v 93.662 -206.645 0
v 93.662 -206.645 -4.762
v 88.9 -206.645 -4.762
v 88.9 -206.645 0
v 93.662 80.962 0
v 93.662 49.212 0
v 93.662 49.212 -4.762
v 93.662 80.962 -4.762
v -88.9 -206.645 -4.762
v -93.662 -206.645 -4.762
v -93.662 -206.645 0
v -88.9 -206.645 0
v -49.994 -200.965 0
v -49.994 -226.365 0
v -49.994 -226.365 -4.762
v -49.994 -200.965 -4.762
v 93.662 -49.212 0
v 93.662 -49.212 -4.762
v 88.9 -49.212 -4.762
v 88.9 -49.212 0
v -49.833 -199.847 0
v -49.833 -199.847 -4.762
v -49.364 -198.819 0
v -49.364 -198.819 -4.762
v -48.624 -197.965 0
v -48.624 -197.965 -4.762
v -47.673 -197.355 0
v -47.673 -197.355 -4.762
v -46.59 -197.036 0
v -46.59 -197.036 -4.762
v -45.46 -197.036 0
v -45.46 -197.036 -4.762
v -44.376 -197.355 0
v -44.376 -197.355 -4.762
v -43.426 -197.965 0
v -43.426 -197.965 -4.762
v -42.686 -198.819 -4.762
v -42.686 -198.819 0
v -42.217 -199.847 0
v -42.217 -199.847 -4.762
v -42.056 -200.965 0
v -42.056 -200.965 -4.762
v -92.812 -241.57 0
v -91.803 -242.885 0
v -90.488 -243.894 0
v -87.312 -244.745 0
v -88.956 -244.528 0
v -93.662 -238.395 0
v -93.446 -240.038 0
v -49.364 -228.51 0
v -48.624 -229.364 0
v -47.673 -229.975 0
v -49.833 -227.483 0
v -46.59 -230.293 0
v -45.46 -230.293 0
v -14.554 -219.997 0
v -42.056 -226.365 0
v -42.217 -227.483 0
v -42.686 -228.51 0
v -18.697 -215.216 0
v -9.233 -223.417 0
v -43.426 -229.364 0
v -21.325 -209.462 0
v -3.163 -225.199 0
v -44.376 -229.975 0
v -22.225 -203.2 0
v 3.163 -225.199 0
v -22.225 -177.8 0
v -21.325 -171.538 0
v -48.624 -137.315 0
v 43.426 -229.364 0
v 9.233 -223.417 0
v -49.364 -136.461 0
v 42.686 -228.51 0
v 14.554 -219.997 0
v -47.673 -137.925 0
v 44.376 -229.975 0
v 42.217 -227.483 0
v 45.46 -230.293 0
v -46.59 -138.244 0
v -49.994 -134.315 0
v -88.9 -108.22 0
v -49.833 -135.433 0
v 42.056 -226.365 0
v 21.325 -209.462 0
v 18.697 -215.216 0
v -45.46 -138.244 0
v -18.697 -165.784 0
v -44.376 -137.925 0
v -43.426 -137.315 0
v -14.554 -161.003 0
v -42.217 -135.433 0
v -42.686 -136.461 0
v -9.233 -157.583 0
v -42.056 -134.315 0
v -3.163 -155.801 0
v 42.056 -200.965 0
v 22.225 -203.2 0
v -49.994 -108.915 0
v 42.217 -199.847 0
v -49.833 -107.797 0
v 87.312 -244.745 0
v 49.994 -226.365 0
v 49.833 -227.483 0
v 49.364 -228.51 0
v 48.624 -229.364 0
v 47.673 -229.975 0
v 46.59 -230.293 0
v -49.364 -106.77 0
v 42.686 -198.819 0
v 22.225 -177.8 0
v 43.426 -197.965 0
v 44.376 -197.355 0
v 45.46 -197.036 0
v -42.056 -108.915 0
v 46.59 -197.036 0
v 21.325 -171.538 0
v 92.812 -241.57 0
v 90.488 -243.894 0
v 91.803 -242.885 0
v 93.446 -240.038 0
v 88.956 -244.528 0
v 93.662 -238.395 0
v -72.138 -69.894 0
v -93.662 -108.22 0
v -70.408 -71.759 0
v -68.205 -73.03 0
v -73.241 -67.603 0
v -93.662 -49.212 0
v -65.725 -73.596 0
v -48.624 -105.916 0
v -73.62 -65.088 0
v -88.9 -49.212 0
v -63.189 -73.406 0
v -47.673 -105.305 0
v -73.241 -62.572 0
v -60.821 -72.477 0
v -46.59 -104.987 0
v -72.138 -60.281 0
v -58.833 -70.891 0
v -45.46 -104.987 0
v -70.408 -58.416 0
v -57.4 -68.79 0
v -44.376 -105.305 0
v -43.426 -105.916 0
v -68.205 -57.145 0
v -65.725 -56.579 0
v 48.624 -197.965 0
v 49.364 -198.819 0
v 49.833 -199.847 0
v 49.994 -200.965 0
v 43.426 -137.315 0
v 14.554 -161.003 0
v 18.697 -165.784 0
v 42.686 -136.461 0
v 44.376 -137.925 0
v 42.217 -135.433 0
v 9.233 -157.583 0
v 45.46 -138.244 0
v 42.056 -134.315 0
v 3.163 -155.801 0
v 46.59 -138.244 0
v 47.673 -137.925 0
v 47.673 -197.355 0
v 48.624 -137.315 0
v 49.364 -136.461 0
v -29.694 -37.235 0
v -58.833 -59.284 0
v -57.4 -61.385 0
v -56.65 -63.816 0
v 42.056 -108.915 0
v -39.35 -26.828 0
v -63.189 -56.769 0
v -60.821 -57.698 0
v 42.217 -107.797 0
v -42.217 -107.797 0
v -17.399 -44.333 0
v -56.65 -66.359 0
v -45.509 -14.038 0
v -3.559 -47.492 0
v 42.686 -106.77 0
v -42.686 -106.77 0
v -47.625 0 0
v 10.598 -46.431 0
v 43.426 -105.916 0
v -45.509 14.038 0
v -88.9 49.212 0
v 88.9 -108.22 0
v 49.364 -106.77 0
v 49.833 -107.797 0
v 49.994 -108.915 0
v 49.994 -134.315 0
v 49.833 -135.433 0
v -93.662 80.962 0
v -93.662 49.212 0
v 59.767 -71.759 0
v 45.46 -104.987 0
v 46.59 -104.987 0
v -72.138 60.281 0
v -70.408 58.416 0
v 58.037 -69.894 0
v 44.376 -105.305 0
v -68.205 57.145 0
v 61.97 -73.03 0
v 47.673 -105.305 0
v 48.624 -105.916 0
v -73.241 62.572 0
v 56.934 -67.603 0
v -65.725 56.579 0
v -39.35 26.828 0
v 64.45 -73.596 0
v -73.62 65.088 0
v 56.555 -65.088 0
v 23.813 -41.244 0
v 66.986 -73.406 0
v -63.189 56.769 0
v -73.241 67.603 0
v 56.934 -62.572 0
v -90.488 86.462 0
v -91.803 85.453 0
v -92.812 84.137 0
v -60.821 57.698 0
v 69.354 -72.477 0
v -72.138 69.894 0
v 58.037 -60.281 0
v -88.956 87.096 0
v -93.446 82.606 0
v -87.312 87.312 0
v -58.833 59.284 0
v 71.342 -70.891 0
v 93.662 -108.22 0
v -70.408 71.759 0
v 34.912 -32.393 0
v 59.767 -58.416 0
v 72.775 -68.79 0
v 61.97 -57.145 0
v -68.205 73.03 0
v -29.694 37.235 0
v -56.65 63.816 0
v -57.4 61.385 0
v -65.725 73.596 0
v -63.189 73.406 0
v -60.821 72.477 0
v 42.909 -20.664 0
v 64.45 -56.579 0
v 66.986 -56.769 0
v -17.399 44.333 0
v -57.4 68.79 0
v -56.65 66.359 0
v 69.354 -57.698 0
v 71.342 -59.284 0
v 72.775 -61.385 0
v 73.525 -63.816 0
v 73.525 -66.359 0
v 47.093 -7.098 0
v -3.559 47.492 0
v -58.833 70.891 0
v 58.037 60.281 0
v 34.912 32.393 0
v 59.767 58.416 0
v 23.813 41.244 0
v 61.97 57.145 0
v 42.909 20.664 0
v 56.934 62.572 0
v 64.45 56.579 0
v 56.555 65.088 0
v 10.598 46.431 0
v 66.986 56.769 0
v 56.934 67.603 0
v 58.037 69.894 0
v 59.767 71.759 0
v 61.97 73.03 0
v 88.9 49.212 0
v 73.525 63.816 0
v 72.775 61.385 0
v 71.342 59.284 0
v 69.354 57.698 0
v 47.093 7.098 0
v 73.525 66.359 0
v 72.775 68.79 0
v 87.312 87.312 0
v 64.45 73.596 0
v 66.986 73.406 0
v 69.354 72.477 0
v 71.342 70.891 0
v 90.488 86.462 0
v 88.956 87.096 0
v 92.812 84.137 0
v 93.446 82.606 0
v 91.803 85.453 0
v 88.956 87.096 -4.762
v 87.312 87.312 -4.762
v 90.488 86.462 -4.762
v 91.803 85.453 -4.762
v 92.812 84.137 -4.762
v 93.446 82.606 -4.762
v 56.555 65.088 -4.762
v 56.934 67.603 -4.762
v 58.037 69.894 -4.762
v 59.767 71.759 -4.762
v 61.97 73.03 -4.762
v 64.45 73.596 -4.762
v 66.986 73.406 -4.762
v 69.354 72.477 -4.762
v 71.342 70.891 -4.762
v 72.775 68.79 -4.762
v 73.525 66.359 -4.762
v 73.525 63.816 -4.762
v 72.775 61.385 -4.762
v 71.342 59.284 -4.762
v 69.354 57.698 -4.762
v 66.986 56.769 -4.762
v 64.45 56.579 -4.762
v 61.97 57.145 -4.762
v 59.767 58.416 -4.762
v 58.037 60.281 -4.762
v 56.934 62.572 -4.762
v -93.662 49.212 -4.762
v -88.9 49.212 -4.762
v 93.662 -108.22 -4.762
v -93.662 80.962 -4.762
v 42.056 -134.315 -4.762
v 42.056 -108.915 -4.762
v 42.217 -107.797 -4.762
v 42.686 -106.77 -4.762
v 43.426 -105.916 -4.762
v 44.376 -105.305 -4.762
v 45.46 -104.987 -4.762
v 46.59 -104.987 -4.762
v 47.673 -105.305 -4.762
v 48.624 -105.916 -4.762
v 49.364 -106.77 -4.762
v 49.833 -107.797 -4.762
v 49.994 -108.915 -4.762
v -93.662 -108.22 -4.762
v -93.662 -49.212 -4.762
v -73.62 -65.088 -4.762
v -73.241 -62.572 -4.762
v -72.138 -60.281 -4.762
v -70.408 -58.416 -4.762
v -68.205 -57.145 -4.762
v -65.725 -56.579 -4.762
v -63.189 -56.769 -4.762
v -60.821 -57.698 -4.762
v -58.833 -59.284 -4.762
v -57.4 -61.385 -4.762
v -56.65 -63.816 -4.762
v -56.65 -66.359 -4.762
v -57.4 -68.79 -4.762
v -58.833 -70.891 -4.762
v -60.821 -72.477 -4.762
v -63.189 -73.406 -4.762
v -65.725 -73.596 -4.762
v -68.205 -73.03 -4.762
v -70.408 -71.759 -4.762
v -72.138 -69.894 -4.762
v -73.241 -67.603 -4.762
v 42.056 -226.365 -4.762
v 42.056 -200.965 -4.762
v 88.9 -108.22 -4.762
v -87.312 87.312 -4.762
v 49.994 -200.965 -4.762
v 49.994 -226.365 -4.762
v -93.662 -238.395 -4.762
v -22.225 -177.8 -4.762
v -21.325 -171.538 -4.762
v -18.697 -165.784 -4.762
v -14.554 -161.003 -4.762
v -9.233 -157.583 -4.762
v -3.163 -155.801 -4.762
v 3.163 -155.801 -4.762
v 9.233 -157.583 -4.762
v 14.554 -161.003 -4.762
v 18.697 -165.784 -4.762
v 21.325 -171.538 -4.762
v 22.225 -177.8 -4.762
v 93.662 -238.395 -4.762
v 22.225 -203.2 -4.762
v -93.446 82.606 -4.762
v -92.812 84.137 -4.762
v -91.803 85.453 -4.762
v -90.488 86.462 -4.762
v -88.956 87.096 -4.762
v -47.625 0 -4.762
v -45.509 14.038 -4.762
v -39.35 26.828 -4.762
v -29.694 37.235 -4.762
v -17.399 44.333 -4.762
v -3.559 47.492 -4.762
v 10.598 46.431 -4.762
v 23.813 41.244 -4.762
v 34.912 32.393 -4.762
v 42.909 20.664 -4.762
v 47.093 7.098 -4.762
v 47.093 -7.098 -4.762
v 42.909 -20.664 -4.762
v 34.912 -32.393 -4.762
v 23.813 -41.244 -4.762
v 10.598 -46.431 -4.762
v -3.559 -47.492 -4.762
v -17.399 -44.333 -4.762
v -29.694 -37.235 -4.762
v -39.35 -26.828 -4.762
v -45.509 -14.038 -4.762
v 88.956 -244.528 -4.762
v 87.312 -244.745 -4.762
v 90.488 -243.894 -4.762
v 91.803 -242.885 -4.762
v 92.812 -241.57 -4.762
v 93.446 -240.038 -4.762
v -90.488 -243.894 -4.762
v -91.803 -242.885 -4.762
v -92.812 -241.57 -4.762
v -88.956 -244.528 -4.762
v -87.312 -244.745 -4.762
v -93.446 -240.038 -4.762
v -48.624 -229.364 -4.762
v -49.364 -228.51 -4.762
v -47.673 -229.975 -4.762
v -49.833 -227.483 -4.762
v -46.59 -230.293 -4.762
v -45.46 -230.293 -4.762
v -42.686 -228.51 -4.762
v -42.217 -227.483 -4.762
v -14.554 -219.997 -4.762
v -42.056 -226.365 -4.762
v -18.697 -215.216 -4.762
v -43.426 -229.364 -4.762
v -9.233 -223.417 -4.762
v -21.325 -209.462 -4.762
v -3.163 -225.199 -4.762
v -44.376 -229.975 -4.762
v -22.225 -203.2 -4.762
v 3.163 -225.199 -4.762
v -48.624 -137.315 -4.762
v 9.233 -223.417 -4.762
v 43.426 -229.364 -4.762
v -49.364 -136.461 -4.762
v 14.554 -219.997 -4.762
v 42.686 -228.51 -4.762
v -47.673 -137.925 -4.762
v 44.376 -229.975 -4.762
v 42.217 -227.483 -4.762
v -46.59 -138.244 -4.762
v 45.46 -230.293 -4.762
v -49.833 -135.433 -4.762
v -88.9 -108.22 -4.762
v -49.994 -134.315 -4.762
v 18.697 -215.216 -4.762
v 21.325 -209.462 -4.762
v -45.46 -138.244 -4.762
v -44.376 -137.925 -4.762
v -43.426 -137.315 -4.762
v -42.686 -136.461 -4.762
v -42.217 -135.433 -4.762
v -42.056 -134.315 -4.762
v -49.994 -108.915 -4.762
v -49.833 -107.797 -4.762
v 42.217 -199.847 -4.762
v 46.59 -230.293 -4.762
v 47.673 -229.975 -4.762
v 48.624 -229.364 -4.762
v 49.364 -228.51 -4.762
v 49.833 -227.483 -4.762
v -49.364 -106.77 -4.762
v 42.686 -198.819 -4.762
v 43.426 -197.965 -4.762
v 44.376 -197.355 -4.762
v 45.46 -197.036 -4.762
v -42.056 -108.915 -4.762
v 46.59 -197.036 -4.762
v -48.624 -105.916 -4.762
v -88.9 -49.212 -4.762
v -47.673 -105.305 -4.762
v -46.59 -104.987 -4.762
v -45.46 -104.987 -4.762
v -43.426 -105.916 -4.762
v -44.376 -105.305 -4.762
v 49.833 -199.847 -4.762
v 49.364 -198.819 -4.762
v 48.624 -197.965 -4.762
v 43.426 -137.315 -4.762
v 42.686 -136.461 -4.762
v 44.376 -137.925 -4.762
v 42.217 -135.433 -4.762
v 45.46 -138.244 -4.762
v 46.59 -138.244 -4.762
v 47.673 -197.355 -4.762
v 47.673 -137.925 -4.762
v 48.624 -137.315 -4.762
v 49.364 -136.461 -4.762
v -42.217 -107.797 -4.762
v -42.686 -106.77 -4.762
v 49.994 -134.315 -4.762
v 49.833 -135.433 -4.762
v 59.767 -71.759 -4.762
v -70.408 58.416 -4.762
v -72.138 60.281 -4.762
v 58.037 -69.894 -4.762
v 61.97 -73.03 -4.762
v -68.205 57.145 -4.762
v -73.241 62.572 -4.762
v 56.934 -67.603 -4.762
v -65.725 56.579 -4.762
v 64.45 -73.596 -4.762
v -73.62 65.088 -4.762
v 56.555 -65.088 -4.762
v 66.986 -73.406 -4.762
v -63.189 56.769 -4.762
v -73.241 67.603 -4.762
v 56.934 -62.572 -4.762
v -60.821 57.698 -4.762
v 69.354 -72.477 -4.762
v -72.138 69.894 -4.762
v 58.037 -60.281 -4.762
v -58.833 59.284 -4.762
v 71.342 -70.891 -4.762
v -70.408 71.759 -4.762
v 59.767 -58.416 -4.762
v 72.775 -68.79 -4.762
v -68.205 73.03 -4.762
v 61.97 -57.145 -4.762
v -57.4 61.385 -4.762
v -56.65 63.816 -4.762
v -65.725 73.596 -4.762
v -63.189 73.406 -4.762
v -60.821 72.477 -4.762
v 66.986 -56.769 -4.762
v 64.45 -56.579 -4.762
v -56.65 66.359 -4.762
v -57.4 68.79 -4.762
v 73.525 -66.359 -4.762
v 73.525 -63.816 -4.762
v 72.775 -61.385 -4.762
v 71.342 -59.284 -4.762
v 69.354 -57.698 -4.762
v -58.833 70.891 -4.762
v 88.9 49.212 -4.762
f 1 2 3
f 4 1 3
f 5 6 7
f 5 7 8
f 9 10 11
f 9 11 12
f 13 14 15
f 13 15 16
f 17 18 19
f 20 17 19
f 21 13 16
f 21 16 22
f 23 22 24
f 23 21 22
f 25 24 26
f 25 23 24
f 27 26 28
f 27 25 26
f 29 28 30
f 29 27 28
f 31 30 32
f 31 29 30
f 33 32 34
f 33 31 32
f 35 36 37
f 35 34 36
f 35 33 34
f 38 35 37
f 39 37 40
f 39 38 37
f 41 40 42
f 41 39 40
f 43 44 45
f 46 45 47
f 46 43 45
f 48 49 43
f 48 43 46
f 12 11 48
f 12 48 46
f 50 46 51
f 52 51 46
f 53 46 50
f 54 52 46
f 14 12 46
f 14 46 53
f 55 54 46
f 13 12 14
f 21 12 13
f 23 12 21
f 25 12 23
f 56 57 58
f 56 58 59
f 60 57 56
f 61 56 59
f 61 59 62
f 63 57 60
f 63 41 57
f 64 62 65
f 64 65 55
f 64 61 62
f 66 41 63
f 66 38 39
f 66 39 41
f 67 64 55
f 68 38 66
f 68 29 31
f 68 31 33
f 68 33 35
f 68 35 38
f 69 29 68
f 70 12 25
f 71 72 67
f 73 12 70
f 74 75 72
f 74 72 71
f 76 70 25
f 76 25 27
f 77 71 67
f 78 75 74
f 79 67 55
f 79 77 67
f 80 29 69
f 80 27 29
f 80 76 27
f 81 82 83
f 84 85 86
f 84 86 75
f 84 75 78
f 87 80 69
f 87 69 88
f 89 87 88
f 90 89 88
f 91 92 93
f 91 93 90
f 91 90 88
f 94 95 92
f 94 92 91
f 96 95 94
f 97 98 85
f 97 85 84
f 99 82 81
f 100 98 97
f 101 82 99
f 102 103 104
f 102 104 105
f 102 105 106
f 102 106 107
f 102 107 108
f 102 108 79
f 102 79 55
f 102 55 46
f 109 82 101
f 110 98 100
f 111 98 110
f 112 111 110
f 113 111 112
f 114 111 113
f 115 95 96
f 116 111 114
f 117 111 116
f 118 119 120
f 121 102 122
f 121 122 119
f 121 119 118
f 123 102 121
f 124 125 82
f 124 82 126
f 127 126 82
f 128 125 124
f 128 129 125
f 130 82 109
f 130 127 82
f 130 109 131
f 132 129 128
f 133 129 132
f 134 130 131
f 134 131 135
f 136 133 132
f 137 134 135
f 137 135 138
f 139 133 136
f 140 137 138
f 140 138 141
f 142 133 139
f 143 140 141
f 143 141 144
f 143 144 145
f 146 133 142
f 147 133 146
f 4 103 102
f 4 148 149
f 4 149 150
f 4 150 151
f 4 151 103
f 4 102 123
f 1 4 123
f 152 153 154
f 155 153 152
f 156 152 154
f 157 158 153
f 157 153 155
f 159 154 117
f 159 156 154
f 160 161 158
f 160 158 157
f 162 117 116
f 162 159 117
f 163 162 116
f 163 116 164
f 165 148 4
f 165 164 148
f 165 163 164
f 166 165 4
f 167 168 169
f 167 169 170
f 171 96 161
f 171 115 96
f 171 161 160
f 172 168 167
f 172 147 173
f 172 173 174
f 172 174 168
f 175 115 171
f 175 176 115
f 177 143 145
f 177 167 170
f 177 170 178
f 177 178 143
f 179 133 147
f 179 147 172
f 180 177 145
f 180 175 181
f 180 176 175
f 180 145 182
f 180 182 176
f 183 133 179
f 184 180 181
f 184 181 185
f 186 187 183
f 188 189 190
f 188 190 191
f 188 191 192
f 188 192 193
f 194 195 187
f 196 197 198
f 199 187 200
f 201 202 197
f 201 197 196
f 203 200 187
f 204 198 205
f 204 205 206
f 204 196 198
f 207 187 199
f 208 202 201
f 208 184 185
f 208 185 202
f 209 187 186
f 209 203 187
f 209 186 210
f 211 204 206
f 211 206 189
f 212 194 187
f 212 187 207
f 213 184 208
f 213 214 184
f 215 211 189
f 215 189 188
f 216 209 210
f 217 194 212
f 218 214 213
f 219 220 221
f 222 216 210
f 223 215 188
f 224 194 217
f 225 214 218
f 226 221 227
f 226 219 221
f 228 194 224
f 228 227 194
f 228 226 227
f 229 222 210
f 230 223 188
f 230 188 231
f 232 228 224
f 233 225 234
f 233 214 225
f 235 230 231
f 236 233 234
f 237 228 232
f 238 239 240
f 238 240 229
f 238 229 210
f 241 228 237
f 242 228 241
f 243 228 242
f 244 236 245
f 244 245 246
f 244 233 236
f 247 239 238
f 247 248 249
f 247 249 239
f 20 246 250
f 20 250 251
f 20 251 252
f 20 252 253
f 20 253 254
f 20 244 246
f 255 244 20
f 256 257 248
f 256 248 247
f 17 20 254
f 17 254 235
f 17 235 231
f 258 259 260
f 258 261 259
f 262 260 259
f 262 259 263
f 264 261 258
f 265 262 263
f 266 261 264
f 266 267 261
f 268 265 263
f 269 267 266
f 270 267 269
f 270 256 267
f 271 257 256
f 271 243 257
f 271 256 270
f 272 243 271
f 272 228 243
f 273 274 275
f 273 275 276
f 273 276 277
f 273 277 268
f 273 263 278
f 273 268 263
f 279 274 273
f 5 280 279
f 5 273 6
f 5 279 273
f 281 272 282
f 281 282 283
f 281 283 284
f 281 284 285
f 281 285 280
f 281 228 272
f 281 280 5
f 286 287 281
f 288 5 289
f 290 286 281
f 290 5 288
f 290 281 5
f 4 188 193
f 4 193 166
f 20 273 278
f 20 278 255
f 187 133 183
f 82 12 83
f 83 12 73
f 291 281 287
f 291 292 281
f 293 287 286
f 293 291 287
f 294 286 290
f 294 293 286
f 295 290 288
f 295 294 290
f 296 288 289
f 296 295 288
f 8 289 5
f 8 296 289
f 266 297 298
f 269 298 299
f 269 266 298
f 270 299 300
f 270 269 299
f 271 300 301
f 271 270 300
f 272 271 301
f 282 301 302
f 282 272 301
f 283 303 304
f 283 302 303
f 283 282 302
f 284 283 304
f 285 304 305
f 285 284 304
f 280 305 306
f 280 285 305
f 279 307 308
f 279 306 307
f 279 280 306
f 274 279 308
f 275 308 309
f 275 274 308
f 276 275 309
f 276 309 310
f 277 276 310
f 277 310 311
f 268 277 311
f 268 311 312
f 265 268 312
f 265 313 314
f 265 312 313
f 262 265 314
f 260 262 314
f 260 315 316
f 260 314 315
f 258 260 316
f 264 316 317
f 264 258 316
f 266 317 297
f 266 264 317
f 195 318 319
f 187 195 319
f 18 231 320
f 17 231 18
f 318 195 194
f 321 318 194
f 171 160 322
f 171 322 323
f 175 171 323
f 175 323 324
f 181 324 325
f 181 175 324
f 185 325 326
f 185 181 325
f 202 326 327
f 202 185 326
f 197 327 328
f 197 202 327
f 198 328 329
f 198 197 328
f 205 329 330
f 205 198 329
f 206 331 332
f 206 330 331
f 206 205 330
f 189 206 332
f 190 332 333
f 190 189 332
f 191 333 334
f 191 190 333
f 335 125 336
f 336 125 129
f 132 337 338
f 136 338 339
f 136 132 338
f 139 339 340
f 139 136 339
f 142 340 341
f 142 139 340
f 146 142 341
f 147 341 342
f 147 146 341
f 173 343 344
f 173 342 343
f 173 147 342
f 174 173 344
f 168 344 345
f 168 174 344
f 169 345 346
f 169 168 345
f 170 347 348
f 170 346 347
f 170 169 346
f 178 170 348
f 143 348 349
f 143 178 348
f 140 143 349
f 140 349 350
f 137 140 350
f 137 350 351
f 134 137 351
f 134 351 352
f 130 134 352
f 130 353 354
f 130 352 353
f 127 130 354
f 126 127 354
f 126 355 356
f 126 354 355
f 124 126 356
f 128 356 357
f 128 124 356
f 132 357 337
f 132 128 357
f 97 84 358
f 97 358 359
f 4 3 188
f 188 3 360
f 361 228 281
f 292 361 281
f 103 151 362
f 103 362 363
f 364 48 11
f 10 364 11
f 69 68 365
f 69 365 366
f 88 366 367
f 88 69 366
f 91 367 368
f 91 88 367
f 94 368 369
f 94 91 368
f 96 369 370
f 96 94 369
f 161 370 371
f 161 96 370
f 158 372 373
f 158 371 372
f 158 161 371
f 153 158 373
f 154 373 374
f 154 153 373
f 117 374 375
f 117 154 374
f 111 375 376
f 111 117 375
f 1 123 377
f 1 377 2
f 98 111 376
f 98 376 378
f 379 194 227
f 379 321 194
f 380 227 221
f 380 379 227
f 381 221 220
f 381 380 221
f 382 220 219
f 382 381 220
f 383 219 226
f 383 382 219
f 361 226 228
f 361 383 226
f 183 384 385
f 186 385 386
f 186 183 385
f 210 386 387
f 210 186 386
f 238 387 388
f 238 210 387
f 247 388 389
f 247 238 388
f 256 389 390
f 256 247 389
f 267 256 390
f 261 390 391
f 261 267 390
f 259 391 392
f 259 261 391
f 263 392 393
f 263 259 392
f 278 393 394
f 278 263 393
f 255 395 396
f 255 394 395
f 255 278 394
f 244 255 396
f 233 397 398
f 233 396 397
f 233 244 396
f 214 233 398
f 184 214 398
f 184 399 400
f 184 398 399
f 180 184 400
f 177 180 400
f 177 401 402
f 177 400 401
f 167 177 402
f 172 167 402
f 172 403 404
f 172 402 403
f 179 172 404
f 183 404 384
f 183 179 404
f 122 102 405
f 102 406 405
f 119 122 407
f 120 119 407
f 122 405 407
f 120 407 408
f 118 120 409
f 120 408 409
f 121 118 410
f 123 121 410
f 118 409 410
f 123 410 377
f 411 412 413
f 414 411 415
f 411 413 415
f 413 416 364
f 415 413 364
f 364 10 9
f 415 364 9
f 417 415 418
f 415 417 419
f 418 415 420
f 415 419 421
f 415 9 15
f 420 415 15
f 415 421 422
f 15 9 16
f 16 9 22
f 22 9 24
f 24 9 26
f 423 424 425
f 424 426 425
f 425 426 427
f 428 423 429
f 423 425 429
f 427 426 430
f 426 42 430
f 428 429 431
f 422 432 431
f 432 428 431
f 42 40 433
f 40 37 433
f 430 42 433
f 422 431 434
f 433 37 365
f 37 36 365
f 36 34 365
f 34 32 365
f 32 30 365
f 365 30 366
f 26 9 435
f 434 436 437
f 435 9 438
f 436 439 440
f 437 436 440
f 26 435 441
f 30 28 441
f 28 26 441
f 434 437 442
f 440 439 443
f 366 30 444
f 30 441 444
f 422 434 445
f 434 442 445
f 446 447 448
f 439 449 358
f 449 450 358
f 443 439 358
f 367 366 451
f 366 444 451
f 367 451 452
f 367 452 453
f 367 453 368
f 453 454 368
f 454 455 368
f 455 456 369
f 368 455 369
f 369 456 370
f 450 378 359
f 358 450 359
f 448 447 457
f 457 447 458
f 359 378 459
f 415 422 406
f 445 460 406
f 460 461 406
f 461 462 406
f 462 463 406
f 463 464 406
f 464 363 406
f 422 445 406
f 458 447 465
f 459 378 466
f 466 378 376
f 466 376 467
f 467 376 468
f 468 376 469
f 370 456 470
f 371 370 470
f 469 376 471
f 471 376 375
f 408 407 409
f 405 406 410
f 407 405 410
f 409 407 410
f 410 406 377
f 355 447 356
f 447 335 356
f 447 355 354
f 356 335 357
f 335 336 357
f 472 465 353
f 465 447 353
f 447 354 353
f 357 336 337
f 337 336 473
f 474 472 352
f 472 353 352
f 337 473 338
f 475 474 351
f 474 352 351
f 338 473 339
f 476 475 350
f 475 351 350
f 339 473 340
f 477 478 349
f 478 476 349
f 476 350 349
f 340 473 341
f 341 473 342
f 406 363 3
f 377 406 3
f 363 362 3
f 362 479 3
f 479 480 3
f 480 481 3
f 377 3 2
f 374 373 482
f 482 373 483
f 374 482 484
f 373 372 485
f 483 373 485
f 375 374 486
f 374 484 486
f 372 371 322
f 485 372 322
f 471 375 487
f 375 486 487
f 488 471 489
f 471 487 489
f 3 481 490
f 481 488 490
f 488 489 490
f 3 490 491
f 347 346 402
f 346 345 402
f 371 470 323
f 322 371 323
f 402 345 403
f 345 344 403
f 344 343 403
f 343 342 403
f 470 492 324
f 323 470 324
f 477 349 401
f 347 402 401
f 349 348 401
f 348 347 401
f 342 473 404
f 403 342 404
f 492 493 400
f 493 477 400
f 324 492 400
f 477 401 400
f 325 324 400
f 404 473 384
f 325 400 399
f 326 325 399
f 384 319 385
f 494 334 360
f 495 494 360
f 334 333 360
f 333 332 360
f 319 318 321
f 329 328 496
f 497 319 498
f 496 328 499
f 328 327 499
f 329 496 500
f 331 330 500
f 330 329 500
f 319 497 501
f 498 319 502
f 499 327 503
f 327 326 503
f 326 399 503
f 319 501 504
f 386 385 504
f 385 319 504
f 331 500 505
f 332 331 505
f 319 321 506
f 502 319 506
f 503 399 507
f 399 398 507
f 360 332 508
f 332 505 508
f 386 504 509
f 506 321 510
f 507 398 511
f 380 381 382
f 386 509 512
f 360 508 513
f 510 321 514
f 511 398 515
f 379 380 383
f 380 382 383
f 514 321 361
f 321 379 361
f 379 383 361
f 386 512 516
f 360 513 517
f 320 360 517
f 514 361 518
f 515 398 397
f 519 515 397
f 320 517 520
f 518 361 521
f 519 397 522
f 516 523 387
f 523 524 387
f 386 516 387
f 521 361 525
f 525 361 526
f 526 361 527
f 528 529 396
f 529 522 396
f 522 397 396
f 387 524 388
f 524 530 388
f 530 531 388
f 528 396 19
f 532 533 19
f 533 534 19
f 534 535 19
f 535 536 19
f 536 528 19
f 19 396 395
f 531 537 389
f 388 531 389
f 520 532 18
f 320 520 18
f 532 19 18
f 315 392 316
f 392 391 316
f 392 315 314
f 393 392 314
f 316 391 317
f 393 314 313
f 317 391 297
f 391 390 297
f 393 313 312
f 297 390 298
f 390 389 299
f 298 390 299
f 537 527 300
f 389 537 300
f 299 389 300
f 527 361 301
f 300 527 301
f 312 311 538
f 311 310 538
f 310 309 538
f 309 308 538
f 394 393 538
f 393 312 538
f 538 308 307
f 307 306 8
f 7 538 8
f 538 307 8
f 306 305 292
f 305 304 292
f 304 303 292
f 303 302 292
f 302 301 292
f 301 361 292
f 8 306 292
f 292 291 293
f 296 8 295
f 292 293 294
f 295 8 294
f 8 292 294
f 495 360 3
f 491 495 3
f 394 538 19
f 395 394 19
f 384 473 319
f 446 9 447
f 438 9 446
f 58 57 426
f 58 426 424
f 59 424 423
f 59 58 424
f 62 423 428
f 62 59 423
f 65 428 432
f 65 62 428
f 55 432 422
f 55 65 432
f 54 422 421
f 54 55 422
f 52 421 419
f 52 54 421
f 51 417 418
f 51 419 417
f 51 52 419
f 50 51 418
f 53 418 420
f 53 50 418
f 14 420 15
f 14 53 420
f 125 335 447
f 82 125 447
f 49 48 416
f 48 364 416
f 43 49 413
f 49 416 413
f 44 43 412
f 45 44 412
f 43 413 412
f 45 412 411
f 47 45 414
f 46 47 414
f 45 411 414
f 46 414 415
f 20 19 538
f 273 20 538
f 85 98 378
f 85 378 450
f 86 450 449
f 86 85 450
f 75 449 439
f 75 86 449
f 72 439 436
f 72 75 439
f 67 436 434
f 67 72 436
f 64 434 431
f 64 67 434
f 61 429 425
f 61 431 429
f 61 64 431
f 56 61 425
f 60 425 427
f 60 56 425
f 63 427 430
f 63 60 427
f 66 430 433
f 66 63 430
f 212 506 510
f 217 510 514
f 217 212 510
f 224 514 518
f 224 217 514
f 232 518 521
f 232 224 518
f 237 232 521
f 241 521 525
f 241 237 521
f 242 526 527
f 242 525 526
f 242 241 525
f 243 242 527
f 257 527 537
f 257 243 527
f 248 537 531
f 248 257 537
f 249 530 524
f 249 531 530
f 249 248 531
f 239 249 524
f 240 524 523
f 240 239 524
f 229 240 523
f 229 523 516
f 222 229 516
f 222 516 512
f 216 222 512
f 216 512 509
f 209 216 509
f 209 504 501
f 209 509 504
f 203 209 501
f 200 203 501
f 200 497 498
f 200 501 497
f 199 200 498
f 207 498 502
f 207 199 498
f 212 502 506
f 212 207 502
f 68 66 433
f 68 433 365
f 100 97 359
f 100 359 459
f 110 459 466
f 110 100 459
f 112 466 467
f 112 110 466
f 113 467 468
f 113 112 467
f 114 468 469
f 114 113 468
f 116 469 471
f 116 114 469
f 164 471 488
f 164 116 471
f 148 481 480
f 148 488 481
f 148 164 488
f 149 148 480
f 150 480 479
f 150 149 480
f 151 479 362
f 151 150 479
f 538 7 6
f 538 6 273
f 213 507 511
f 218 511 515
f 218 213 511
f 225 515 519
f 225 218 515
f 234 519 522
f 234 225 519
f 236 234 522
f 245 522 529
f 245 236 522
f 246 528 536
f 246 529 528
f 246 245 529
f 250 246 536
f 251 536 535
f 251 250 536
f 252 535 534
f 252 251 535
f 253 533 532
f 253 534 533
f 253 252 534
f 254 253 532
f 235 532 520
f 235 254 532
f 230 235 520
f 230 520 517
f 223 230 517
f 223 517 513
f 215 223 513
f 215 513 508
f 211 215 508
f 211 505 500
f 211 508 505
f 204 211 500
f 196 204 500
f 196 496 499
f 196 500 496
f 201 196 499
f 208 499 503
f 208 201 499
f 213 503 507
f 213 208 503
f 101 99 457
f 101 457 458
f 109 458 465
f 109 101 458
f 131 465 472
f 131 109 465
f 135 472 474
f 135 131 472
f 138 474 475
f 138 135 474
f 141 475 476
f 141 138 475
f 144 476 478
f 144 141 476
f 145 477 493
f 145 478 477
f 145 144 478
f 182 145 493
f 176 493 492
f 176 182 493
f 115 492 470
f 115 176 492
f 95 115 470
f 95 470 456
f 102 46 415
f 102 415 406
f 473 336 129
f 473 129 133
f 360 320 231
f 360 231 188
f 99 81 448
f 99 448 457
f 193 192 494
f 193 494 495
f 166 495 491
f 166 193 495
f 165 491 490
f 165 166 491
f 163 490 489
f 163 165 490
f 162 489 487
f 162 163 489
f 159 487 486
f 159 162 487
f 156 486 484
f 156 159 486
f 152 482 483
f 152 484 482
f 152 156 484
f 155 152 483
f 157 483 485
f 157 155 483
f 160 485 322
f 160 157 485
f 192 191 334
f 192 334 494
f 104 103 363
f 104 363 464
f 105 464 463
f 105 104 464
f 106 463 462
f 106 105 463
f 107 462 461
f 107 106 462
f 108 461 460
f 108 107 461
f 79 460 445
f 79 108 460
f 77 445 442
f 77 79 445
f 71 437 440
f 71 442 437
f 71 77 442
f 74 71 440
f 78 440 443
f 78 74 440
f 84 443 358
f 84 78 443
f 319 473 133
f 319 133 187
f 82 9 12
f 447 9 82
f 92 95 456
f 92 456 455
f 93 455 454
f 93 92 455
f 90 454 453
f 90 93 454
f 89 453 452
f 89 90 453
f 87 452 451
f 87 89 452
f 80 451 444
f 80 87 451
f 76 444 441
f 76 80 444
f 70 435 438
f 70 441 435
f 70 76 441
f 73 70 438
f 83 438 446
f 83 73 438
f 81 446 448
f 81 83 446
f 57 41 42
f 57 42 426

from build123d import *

# Parameters (mm, degrees)
SKETCH1_W          = 187.325
SKETCH1_H          = 332.057083461
EXTRUDE1_DEPTH     = 4.7625
CUT_EXTRUDE1_REACH = 264.098
CUT_EXTRUDE2_REACH = 264.098
SKETCH3_R          = 47.625
SKETCH3_R_2        = 8.5328125
FILLET1_R          = 6.35
CUT_EXTRUDE3_REACH = 264.098
SKETCH4_W          = 4.7625
SKETCH4_H          = 98.425


with BuildPart() as part:
    # Sketch1 → Extrude1 (new body)
    with BuildSketch(Plane.XY):
        with Locations((0, -78.716041731)):
            Rectangle(SKETCH1_W, SKETCH1_H)
    extrude(amount=-EXTRUDE1_DEPTH)

    # Sketch2 → Cut-Extrude1 (cut, up to next)
    with BuildSketch(Plane.XY, mode=Mode.PRIVATE) as cut_extrude1_sk1:
        with BuildLine():
            Line((-22.225, -203.2), (-22.225, -177.8))
            ThreePointArc((-22.225, -177.8), (0, -155.575), (22.225, -177.8))
            Line((22.225, -177.8), (22.225, -203.2))
            ThreePointArc((22.225, -203.2), (0, -225.425), (-22.225, -203.2))
        make_face()
    cut_extrude1_tool1 = extrude(cut_extrude1_sk1.sketch, amount=-CUT_EXTRUDE1_REACH, mode=Mode.PRIVATE) & part.part
    # Sketch2 → Cut-Extrude1 (cut, up to next)
    with BuildSketch(Plane.XY, mode=Mode.PRIVATE) as cut_extrude1_sk2:
        with BuildLine():
            Line((49.99355, -108.9152), (49.99355, -134.3152))
            ThreePointArc((49.99355, -134.3152), (46.0248, -138.28395), (42.05605, -134.3152))
            Line((42.05605, -134.3152), (42.05605, -108.9152))
            ThreePointArc((42.05605, -108.9152), (46.0248, -104.94645), (49.99355, -108.9152))
        make_face()
    cut_extrude1_tool2 = extrude(cut_extrude1_sk2.sketch, amount=-CUT_EXTRUDE1_REACH, mode=Mode.PRIVATE) & part.part
    # Sketch2 → Cut-Extrude1 (cut, up to next)
    with BuildSketch(Plane.XY, mode=Mode.PRIVATE) as cut_extrude1_sk3:
        with BuildLine():
            Line((-42.05605, -108.9152), (-42.05605, -134.3152))
            ThreePointArc((-42.05605, -134.3152), (-46.0248, -138.28395), (-49.99355, -134.3152))
            Line((-49.99355, -134.3152), (-49.99355, -108.9152))
            ThreePointArc((-49.99355, -108.9152), (-46.0248, -104.94645), (-42.05605, -108.9152))
        make_face()
    cut_extrude1_tool3 = extrude(cut_extrude1_sk3.sketch, amount=-CUT_EXTRUDE1_REACH, mode=Mode.PRIVATE) & part.part
    # Sketch2 → Cut-Extrude1 (cut, up to next)
    with BuildSketch(Plane.XY, mode=Mode.PRIVATE) as cut_extrude1_sk4:
        with BuildLine():
            Line((49.99355, -200.9648), (49.99355, -226.3648))
            ThreePointArc((49.99355, -226.3648), (46.0248, -230.33355), (42.05605, -226.3648))
            Line((42.05605, -226.3648), (42.05605, -200.9648))
            ThreePointArc((42.05605, -200.9648), (46.0248, -196.99605), (49.99355, -200.9648))
        make_face()
    cut_extrude1_tool4 = extrude(cut_extrude1_sk4.sketch, amount=-CUT_EXTRUDE1_REACH, mode=Mode.PRIVATE) & part.part
    # Sketch2 → Cut-Extrude1 (cut, up to next)
    with BuildSketch(Plane.XY, mode=Mode.PRIVATE) as cut_extrude1_sk5:
        with BuildLine():
            Line((-42.05605, -200.9648), (-42.05605, -226.3648))
            ThreePointArc((-42.05605, -226.3648), (-46.0248, -230.33355), (-49.99355, -226.3648))
            Line((-49.99355, -226.3648), (-49.99355, -200.9648))
            ThreePointArc((-49.99355, -200.9648), (-46.0248, -196.99605), (-42.05605, -200.9648))
        make_face()
    cut_extrude1_tool5 = extrude(cut_extrude1_sk5.sketch, amount=-CUT_EXTRUDE1_REACH, mode=Mode.PRIVATE) & part.part
    add(cut_extrude1_tool1.solids().sort_by_distance((0, -190.5, 0))[0], mode=Mode.SUBTRACT)
    add(cut_extrude1_tool2.solids().sort_by_distance((46.0248, -121.6152, 0))[0], mode=Mode.SUBTRACT)
    add(cut_extrude1_tool3.solids().sort_by_distance((-46.0248, -121.6152, 0))[0], mode=Mode.SUBTRACT)
    add(cut_extrude1_tool4.solids().sort_by_distance((46.0248, -213.6648, 0))[0], mode=Mode.SUBTRACT)
    add(cut_extrude1_tool5.solids().sort_by_distance((-46.0248, -213.6648, 0))[0], mode=Mode.SUBTRACT)

    # Sketch3 → Cut-Extrude2 (cut, up to next)
    with BuildSketch(Plane(origin=(0, 0, 0), x_dir=(-1, 0, 0), z_dir=(0, 0, -1)), mode=Mode.PRIVATE) as cut_extrude2_sk1:
        Circle(SKETCH3_R)
    cut_extrude2_tool1 = extrude(cut_extrude2_sk1.sketch, amount=CUT_EXTRUDE2_REACH, mode=Mode.PRIVATE) & part.part
    # Sketch3 → Cut-Extrude2 (cut, up to next)
    with BuildSketch(Plane(origin=(0, 0, 0), x_dir=(-1, 0, 0), z_dir=(0, 0, -1)), mode=Mode.PRIVATE) as cut_extrude2_sk2:
        with Locations((65.0875, 65.0875)):
            Circle(SKETCH3_R_2)
    cut_extrude2_tool2 = extrude(cut_extrude2_sk2.sketch, amount=CUT_EXTRUDE2_REACH, mode=Mode.PRIVATE) & part.part
    # Sketch3 → Cut-Extrude2 (cut, up to next)
    with BuildSketch(Plane(origin=(0, 0, 0), x_dir=(-1, 0, 0), z_dir=(0, 0, -1)), mode=Mode.PRIVATE) as cut_extrude2_sk3:
        with Locations((-65.0875, 65.0875)):
            Circle(SKETCH3_R_2)
    cut_extrude2_tool3 = extrude(cut_extrude2_sk3.sketch, amount=CUT_EXTRUDE2_REACH, mode=Mode.PRIVATE) & part.part
    # Sketch3 → Cut-Extrude2 (cut, up to next)
    with BuildSketch(Plane(origin=(0, 0, 0), x_dir=(-1, 0, 0), z_dir=(0, 0, -1)), mode=Mode.PRIVATE) as cut_extrude2_sk4:
        with Locations((-65.0875, -65.0875)):
            Circle(SKETCH3_R_2)
    cut_extrude2_tool4 = extrude(cut_extrude2_sk4.sketch, amount=CUT_EXTRUDE2_REACH, mode=Mode.PRIVATE) & part.part
    # Sketch3 → Cut-Extrude2 (cut, up to next)
    with BuildSketch(Plane(origin=(0, 0, 0), x_dir=(-1, 0, 0), z_dir=(0, 0, -1)), mode=Mode.PRIVATE) as cut_extrude2_sk5:
        with Locations((65.0875, -65.0875)):
            Circle(SKETCH3_R_2)
    cut_extrude2_tool5 = extrude(cut_extrude2_sk5.sketch, amount=CUT_EXTRUDE2_REACH, mode=Mode.PRIVATE) & part.part
    add(cut_extrude2_tool1.solids().sort_by_distance((0, 0, 0))[0], mode=Mode.SUBTRACT)
    add(cut_extrude2_tool2.solids().sort_by_distance((-65.0875, 65.0875, 0))[0], mode=Mode.SUBTRACT)
    add(cut_extrude2_tool3.solids().sort_by_distance((65.0875, 65.0875, 0))[0], mode=Mode.SUBTRACT)
    add(cut_extrude2_tool4.solids().sort_by_distance((65.0875, -65.0875, 0))[0], mode=Mode.SUBTRACT)
    add(cut_extrude2_tool5.solids().sort_by_distance((-65.0875, -65.0875, 0))[0], mode=Mode.SUBTRACT)

    # Fillet1
    fillet1_edges = [part.edges().sort_by_distance(p)[0] for p in [
        (93.6625, -244.744583461, -2.38125),
        (-93.6625, -244.744583461, -2.38125),
        (-93.6625, 87.3125, -2.38125),
        (93.6625, 87.3125, -2.38125),
    ]]
    fillet(fillet1_edges, radius=FILLET1_R)

    # Sketch4 → Cut-Extrude3 (cut, up to next)
    with BuildSketch(Plane(origin=(0, 0, -4.7625), x_dir=(-1, 0, 0), z_dir=(0, 0, -1)), mode=Mode.PRIVATE) as cut_extrude3_sk1:
        with Locations((-91.28125, 0)):
            Rectangle(SKETCH4_W, SKETCH4_H)
    cut_extrude3_tool1 = extrude(cut_extrude3_sk1.sketch, amount=-CUT_EXTRUDE3_REACH, mode=Mode.PRIVATE) & part.part
    # Sketch4 → Cut-Extrude3 (cut, up to next)
    with BuildSketch(Plane(origin=(0, 0, -4.7625), x_dir=(-1, 0, 0), z_dir=(0, 0, -1)), mode=Mode.PRIVATE) as cut_extrude3_sk2:
        with Locations((-91.28125, -157.432083461)):
            Rectangle(SKETCH4_W, SKETCH4_H)
    cut_extrude3_tool2 = extrude(cut_extrude3_sk2.sketch, amount=-CUT_EXTRUDE3_REACH, mode=Mode.PRIVATE) & part.part
    cut_extrude3_1 = cut_extrude3_tool1.solids().sort_by_distance((91.28125, 0, -4.7625))[0]
    add(cut_extrude3_1, mode=Mode.SUBTRACT)
    cut_extrude3_2 = cut_extrude3_tool2.solids().sort_by_distance((91.28125, -157.432083, -4.7625))[0]
    add(cut_extrude3_2, mode=Mode.SUBTRACT)
    cut_extrude3 = cut_extrude3_1 + cut_extrude3_2  # Cut-Extrude3 as one shape, for the pattern or mirror that repeats it

    # Mirror1: Cut-Extrude3 across plane
    add(cut_extrude3.mirror(Plane(origin=(0, 0, 0), x_dir=(0, 0, 1), z_dir=(1, 0, 0))), mode=Mode.SUBTRACT)


solid = part.part
